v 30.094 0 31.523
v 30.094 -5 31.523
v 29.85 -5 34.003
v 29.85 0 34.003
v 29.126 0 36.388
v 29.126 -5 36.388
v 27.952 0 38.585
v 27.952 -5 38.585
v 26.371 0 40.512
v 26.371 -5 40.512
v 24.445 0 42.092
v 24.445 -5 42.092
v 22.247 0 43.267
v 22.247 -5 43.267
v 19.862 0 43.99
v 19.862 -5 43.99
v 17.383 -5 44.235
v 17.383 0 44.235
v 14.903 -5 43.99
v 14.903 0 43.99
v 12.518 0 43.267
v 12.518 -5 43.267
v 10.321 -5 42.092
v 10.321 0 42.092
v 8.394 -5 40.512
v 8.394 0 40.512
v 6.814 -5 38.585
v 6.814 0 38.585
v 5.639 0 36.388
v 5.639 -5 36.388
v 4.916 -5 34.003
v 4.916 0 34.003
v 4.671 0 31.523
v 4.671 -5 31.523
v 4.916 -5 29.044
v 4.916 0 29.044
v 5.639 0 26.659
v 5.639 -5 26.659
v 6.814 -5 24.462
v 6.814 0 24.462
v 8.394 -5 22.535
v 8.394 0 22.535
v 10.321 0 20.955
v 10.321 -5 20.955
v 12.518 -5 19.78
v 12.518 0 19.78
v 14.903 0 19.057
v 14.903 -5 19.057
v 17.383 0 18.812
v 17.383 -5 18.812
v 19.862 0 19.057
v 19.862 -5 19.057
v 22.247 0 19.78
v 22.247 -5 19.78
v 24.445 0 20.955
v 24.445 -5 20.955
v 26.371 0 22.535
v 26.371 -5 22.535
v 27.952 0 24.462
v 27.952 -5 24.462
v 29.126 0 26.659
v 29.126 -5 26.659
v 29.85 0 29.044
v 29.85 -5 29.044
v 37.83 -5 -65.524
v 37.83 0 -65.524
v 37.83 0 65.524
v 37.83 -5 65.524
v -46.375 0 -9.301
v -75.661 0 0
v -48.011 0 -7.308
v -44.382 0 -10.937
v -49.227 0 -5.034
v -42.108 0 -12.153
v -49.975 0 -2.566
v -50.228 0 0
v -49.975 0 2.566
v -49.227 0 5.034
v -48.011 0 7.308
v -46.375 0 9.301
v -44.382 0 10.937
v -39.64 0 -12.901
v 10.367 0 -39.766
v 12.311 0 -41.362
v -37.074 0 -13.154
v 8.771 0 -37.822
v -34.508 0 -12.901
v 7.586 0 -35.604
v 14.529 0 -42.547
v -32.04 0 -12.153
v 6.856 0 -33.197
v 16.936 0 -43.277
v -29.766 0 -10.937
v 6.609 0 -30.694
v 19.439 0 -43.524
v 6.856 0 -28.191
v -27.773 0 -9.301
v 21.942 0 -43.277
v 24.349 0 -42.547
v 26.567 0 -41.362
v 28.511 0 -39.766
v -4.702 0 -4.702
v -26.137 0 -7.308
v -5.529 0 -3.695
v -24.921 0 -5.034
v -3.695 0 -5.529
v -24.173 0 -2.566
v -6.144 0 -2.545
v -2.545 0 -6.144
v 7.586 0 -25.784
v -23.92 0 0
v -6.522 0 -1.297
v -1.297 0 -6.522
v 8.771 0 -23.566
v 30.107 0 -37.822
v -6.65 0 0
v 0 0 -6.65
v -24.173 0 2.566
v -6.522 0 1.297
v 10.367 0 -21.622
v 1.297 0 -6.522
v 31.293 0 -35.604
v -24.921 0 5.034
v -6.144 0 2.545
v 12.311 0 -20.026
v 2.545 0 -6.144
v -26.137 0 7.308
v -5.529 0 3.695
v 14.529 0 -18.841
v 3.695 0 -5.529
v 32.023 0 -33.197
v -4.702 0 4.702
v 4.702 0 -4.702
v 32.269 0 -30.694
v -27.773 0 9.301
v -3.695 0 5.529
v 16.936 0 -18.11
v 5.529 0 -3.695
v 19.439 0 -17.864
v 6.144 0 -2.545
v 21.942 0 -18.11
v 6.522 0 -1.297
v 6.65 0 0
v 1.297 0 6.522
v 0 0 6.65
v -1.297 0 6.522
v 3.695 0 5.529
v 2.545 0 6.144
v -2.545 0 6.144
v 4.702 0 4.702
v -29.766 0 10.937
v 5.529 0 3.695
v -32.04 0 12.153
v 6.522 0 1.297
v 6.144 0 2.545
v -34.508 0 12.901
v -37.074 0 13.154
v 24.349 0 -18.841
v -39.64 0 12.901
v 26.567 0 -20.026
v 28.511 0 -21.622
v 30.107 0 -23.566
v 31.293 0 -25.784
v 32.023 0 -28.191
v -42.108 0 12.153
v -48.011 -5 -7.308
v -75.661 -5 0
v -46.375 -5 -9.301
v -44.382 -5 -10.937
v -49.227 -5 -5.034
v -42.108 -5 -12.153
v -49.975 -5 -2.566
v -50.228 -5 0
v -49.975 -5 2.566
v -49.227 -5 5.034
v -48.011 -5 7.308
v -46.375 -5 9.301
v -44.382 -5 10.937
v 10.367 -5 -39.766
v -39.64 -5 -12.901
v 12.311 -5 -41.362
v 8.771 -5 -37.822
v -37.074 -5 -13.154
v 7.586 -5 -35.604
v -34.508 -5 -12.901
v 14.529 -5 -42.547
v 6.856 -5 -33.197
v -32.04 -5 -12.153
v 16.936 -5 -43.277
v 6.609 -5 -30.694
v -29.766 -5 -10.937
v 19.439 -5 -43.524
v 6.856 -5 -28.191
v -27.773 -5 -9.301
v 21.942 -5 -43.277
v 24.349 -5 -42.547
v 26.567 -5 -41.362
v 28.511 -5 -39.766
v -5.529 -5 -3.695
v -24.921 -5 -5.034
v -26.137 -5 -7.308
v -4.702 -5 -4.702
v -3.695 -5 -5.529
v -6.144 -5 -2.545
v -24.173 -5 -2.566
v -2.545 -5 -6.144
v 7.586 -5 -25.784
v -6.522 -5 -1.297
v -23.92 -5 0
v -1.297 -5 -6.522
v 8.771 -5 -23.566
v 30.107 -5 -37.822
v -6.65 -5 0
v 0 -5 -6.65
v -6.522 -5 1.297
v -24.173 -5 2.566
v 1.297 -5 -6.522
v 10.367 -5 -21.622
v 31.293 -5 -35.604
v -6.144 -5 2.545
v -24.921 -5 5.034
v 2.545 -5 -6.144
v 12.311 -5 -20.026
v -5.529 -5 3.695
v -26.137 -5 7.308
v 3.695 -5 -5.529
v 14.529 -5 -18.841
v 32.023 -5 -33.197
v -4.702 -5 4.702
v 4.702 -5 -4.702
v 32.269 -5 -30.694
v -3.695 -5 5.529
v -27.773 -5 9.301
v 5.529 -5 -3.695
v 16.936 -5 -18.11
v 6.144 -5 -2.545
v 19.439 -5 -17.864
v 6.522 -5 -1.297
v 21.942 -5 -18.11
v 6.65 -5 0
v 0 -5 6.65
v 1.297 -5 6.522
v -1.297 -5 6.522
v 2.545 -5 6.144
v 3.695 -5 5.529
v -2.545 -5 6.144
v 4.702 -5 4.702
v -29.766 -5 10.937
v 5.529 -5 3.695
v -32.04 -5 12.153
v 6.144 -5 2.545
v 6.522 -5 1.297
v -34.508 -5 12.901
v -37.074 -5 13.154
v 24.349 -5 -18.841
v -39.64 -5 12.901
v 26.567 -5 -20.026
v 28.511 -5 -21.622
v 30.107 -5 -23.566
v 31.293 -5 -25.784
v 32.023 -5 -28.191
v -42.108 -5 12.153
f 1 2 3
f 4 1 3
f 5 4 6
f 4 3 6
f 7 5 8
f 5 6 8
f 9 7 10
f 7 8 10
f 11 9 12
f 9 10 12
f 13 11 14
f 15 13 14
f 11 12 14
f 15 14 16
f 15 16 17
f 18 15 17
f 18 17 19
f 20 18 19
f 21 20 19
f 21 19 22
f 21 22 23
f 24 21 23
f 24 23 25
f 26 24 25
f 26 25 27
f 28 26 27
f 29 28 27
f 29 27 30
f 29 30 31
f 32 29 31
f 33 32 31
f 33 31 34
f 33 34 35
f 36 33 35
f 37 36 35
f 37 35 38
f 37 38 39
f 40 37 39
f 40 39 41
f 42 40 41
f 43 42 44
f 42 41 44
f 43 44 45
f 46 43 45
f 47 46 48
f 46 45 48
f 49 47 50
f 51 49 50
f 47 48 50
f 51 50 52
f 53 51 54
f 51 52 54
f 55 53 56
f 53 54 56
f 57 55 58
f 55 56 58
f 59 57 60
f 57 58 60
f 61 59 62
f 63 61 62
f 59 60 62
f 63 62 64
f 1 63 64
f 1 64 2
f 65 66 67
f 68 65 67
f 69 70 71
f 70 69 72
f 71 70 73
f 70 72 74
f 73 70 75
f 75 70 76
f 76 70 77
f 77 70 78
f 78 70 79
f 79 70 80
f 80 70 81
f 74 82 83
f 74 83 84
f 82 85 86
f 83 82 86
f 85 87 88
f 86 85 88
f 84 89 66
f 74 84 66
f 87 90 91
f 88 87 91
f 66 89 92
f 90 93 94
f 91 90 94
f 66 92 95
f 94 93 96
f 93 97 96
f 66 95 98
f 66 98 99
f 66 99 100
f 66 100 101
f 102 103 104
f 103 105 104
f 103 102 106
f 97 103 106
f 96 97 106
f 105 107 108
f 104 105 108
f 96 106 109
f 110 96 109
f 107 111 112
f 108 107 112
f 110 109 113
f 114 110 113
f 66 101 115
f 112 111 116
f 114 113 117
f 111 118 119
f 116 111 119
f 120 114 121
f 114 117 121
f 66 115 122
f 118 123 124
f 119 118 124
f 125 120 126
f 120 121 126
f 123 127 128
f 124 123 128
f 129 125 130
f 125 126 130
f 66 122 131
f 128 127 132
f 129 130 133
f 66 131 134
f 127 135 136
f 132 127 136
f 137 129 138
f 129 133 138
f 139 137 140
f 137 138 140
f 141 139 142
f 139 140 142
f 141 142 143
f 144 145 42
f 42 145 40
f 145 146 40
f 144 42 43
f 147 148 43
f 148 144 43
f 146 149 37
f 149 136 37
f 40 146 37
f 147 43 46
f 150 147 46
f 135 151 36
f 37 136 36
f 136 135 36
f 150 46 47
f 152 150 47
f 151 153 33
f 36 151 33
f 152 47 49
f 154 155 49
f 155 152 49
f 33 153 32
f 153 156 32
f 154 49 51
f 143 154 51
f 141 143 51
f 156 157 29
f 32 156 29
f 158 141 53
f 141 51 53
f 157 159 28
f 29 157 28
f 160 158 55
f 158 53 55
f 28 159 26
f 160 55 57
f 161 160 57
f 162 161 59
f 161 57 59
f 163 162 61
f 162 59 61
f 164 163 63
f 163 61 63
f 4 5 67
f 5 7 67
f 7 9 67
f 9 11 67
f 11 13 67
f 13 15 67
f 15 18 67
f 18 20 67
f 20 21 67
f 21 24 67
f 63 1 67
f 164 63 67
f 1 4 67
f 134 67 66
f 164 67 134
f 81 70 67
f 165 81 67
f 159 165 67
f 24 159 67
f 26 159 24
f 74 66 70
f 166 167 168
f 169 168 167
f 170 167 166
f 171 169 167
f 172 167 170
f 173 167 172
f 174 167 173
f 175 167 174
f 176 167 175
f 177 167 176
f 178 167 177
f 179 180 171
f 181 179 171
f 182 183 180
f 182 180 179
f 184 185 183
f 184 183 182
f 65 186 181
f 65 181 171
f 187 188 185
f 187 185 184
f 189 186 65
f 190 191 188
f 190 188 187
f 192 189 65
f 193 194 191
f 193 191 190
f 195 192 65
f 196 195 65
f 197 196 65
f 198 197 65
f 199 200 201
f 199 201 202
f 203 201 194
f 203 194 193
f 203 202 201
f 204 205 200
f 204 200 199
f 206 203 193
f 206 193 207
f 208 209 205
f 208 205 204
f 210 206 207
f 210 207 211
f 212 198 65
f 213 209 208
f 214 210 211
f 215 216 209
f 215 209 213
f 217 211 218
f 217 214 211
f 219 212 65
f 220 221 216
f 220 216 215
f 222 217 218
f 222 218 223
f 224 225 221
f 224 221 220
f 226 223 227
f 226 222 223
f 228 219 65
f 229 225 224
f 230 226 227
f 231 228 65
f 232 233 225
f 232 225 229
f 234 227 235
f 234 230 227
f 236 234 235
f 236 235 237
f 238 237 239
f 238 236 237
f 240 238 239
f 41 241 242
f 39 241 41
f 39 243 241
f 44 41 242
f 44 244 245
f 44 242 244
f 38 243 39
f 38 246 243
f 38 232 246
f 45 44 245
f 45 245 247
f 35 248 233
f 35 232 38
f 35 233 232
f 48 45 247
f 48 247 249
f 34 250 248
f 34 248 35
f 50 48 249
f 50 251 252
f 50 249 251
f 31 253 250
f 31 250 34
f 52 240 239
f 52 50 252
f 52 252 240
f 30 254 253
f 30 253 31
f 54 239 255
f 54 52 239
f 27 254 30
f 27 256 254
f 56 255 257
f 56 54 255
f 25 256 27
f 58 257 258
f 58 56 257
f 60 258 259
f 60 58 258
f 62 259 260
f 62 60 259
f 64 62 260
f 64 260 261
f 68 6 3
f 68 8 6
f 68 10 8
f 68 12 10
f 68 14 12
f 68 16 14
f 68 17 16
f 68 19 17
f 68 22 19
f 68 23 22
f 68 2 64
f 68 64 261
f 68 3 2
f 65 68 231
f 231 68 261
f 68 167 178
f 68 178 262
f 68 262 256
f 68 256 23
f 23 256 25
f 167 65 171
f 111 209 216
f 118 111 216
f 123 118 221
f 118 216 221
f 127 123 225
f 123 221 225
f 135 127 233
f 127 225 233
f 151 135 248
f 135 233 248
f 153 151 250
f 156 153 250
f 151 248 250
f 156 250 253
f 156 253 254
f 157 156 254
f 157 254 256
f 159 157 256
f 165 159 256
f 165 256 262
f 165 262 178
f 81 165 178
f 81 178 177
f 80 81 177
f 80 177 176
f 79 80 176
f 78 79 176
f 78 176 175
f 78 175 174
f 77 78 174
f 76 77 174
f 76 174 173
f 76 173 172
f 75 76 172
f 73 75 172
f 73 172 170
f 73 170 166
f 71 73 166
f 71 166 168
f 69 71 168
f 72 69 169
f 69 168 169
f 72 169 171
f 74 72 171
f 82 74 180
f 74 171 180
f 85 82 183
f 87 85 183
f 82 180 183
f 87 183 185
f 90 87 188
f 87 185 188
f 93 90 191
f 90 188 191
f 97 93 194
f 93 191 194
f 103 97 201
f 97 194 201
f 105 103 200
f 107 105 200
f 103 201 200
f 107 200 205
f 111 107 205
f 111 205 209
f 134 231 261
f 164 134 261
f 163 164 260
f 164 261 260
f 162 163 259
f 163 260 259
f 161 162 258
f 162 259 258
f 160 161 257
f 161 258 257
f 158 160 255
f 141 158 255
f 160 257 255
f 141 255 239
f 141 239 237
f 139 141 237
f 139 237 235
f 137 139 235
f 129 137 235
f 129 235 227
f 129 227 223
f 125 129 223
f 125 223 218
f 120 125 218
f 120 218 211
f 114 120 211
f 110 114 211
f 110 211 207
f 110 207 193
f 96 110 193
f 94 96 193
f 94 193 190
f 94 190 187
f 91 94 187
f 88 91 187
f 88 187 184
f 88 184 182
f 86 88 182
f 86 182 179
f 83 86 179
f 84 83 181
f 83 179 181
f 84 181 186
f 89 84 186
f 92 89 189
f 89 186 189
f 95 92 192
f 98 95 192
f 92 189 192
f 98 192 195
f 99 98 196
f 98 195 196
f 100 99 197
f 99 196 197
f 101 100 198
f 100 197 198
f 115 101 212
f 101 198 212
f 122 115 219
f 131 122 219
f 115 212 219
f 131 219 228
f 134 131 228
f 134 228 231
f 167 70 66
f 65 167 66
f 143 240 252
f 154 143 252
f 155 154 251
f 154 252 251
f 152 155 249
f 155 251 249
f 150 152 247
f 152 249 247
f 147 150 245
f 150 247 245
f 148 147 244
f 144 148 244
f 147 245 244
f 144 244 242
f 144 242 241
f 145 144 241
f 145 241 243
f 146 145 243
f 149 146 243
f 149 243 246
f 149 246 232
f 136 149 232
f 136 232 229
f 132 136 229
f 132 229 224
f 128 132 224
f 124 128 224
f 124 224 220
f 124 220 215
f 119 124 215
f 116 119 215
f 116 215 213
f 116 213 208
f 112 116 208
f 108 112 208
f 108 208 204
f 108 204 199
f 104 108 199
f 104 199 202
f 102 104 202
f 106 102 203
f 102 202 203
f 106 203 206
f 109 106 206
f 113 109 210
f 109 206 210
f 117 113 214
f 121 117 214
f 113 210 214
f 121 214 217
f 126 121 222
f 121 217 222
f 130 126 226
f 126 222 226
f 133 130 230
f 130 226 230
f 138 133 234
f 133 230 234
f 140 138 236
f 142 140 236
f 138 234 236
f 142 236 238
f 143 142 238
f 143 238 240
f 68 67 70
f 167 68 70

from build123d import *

# Parameters (mm, degrees)
F1_DEPTH  = 5
F2_R      = 13.153904
F4_DEPTH  = 51.562
F3_R      = 12.711179
F5_DEPTH  = 34.29
F6_R      = 12.830004
F7_DEPTH  = 49.276
F9_R      = 6.65
F10_DEPTH = 25.4


with BuildPart() as f1:
    # F0 (on Front) → F1 (new body)
    with BuildSketch(Plane.XZ):
        Polygon((37.830465, -65.524287), (37.830465, 65.524287), (-75.660929, 0), align=None)
    extrude(amount=F1_DEPTH)

    # F2 (on face) → F4 (cut)
    with BuildSketch(Plane.XZ.offset(5)):
        with Locations((-37.074074, 0)):
            Circle(F2_R)
    extrude(amount=-F4_DEPTH, mode=Mode.SUBTRACT)

    # F3 (on face) → F5 (cut)
    with BuildSketch(Plane.XZ.offset(5)):
        with Locations((17.382601, 31.523474)):
            Circle(F3_R)
    extrude(amount=-F5_DEPTH, mode=Mode.SUBTRACT)

    # F6 (on face) → F7 (cut)
    with BuildSketch(Plane.XZ.offset(5)):
        with Locations((19.439183, -30.693928)):
            Circle(F6_R)
    extrude(amount=-F7_DEPTH, mode=Mode.SUBTRACT)

    # F9 (on face) → F10 (cut)
    with BuildSketch(Plane.XZ.offset(5)):
        Circle(F9_R)
    extrude(amount=-F10_DEPTH, mode=Mode.SUBTRACT)


solid = f1.part
